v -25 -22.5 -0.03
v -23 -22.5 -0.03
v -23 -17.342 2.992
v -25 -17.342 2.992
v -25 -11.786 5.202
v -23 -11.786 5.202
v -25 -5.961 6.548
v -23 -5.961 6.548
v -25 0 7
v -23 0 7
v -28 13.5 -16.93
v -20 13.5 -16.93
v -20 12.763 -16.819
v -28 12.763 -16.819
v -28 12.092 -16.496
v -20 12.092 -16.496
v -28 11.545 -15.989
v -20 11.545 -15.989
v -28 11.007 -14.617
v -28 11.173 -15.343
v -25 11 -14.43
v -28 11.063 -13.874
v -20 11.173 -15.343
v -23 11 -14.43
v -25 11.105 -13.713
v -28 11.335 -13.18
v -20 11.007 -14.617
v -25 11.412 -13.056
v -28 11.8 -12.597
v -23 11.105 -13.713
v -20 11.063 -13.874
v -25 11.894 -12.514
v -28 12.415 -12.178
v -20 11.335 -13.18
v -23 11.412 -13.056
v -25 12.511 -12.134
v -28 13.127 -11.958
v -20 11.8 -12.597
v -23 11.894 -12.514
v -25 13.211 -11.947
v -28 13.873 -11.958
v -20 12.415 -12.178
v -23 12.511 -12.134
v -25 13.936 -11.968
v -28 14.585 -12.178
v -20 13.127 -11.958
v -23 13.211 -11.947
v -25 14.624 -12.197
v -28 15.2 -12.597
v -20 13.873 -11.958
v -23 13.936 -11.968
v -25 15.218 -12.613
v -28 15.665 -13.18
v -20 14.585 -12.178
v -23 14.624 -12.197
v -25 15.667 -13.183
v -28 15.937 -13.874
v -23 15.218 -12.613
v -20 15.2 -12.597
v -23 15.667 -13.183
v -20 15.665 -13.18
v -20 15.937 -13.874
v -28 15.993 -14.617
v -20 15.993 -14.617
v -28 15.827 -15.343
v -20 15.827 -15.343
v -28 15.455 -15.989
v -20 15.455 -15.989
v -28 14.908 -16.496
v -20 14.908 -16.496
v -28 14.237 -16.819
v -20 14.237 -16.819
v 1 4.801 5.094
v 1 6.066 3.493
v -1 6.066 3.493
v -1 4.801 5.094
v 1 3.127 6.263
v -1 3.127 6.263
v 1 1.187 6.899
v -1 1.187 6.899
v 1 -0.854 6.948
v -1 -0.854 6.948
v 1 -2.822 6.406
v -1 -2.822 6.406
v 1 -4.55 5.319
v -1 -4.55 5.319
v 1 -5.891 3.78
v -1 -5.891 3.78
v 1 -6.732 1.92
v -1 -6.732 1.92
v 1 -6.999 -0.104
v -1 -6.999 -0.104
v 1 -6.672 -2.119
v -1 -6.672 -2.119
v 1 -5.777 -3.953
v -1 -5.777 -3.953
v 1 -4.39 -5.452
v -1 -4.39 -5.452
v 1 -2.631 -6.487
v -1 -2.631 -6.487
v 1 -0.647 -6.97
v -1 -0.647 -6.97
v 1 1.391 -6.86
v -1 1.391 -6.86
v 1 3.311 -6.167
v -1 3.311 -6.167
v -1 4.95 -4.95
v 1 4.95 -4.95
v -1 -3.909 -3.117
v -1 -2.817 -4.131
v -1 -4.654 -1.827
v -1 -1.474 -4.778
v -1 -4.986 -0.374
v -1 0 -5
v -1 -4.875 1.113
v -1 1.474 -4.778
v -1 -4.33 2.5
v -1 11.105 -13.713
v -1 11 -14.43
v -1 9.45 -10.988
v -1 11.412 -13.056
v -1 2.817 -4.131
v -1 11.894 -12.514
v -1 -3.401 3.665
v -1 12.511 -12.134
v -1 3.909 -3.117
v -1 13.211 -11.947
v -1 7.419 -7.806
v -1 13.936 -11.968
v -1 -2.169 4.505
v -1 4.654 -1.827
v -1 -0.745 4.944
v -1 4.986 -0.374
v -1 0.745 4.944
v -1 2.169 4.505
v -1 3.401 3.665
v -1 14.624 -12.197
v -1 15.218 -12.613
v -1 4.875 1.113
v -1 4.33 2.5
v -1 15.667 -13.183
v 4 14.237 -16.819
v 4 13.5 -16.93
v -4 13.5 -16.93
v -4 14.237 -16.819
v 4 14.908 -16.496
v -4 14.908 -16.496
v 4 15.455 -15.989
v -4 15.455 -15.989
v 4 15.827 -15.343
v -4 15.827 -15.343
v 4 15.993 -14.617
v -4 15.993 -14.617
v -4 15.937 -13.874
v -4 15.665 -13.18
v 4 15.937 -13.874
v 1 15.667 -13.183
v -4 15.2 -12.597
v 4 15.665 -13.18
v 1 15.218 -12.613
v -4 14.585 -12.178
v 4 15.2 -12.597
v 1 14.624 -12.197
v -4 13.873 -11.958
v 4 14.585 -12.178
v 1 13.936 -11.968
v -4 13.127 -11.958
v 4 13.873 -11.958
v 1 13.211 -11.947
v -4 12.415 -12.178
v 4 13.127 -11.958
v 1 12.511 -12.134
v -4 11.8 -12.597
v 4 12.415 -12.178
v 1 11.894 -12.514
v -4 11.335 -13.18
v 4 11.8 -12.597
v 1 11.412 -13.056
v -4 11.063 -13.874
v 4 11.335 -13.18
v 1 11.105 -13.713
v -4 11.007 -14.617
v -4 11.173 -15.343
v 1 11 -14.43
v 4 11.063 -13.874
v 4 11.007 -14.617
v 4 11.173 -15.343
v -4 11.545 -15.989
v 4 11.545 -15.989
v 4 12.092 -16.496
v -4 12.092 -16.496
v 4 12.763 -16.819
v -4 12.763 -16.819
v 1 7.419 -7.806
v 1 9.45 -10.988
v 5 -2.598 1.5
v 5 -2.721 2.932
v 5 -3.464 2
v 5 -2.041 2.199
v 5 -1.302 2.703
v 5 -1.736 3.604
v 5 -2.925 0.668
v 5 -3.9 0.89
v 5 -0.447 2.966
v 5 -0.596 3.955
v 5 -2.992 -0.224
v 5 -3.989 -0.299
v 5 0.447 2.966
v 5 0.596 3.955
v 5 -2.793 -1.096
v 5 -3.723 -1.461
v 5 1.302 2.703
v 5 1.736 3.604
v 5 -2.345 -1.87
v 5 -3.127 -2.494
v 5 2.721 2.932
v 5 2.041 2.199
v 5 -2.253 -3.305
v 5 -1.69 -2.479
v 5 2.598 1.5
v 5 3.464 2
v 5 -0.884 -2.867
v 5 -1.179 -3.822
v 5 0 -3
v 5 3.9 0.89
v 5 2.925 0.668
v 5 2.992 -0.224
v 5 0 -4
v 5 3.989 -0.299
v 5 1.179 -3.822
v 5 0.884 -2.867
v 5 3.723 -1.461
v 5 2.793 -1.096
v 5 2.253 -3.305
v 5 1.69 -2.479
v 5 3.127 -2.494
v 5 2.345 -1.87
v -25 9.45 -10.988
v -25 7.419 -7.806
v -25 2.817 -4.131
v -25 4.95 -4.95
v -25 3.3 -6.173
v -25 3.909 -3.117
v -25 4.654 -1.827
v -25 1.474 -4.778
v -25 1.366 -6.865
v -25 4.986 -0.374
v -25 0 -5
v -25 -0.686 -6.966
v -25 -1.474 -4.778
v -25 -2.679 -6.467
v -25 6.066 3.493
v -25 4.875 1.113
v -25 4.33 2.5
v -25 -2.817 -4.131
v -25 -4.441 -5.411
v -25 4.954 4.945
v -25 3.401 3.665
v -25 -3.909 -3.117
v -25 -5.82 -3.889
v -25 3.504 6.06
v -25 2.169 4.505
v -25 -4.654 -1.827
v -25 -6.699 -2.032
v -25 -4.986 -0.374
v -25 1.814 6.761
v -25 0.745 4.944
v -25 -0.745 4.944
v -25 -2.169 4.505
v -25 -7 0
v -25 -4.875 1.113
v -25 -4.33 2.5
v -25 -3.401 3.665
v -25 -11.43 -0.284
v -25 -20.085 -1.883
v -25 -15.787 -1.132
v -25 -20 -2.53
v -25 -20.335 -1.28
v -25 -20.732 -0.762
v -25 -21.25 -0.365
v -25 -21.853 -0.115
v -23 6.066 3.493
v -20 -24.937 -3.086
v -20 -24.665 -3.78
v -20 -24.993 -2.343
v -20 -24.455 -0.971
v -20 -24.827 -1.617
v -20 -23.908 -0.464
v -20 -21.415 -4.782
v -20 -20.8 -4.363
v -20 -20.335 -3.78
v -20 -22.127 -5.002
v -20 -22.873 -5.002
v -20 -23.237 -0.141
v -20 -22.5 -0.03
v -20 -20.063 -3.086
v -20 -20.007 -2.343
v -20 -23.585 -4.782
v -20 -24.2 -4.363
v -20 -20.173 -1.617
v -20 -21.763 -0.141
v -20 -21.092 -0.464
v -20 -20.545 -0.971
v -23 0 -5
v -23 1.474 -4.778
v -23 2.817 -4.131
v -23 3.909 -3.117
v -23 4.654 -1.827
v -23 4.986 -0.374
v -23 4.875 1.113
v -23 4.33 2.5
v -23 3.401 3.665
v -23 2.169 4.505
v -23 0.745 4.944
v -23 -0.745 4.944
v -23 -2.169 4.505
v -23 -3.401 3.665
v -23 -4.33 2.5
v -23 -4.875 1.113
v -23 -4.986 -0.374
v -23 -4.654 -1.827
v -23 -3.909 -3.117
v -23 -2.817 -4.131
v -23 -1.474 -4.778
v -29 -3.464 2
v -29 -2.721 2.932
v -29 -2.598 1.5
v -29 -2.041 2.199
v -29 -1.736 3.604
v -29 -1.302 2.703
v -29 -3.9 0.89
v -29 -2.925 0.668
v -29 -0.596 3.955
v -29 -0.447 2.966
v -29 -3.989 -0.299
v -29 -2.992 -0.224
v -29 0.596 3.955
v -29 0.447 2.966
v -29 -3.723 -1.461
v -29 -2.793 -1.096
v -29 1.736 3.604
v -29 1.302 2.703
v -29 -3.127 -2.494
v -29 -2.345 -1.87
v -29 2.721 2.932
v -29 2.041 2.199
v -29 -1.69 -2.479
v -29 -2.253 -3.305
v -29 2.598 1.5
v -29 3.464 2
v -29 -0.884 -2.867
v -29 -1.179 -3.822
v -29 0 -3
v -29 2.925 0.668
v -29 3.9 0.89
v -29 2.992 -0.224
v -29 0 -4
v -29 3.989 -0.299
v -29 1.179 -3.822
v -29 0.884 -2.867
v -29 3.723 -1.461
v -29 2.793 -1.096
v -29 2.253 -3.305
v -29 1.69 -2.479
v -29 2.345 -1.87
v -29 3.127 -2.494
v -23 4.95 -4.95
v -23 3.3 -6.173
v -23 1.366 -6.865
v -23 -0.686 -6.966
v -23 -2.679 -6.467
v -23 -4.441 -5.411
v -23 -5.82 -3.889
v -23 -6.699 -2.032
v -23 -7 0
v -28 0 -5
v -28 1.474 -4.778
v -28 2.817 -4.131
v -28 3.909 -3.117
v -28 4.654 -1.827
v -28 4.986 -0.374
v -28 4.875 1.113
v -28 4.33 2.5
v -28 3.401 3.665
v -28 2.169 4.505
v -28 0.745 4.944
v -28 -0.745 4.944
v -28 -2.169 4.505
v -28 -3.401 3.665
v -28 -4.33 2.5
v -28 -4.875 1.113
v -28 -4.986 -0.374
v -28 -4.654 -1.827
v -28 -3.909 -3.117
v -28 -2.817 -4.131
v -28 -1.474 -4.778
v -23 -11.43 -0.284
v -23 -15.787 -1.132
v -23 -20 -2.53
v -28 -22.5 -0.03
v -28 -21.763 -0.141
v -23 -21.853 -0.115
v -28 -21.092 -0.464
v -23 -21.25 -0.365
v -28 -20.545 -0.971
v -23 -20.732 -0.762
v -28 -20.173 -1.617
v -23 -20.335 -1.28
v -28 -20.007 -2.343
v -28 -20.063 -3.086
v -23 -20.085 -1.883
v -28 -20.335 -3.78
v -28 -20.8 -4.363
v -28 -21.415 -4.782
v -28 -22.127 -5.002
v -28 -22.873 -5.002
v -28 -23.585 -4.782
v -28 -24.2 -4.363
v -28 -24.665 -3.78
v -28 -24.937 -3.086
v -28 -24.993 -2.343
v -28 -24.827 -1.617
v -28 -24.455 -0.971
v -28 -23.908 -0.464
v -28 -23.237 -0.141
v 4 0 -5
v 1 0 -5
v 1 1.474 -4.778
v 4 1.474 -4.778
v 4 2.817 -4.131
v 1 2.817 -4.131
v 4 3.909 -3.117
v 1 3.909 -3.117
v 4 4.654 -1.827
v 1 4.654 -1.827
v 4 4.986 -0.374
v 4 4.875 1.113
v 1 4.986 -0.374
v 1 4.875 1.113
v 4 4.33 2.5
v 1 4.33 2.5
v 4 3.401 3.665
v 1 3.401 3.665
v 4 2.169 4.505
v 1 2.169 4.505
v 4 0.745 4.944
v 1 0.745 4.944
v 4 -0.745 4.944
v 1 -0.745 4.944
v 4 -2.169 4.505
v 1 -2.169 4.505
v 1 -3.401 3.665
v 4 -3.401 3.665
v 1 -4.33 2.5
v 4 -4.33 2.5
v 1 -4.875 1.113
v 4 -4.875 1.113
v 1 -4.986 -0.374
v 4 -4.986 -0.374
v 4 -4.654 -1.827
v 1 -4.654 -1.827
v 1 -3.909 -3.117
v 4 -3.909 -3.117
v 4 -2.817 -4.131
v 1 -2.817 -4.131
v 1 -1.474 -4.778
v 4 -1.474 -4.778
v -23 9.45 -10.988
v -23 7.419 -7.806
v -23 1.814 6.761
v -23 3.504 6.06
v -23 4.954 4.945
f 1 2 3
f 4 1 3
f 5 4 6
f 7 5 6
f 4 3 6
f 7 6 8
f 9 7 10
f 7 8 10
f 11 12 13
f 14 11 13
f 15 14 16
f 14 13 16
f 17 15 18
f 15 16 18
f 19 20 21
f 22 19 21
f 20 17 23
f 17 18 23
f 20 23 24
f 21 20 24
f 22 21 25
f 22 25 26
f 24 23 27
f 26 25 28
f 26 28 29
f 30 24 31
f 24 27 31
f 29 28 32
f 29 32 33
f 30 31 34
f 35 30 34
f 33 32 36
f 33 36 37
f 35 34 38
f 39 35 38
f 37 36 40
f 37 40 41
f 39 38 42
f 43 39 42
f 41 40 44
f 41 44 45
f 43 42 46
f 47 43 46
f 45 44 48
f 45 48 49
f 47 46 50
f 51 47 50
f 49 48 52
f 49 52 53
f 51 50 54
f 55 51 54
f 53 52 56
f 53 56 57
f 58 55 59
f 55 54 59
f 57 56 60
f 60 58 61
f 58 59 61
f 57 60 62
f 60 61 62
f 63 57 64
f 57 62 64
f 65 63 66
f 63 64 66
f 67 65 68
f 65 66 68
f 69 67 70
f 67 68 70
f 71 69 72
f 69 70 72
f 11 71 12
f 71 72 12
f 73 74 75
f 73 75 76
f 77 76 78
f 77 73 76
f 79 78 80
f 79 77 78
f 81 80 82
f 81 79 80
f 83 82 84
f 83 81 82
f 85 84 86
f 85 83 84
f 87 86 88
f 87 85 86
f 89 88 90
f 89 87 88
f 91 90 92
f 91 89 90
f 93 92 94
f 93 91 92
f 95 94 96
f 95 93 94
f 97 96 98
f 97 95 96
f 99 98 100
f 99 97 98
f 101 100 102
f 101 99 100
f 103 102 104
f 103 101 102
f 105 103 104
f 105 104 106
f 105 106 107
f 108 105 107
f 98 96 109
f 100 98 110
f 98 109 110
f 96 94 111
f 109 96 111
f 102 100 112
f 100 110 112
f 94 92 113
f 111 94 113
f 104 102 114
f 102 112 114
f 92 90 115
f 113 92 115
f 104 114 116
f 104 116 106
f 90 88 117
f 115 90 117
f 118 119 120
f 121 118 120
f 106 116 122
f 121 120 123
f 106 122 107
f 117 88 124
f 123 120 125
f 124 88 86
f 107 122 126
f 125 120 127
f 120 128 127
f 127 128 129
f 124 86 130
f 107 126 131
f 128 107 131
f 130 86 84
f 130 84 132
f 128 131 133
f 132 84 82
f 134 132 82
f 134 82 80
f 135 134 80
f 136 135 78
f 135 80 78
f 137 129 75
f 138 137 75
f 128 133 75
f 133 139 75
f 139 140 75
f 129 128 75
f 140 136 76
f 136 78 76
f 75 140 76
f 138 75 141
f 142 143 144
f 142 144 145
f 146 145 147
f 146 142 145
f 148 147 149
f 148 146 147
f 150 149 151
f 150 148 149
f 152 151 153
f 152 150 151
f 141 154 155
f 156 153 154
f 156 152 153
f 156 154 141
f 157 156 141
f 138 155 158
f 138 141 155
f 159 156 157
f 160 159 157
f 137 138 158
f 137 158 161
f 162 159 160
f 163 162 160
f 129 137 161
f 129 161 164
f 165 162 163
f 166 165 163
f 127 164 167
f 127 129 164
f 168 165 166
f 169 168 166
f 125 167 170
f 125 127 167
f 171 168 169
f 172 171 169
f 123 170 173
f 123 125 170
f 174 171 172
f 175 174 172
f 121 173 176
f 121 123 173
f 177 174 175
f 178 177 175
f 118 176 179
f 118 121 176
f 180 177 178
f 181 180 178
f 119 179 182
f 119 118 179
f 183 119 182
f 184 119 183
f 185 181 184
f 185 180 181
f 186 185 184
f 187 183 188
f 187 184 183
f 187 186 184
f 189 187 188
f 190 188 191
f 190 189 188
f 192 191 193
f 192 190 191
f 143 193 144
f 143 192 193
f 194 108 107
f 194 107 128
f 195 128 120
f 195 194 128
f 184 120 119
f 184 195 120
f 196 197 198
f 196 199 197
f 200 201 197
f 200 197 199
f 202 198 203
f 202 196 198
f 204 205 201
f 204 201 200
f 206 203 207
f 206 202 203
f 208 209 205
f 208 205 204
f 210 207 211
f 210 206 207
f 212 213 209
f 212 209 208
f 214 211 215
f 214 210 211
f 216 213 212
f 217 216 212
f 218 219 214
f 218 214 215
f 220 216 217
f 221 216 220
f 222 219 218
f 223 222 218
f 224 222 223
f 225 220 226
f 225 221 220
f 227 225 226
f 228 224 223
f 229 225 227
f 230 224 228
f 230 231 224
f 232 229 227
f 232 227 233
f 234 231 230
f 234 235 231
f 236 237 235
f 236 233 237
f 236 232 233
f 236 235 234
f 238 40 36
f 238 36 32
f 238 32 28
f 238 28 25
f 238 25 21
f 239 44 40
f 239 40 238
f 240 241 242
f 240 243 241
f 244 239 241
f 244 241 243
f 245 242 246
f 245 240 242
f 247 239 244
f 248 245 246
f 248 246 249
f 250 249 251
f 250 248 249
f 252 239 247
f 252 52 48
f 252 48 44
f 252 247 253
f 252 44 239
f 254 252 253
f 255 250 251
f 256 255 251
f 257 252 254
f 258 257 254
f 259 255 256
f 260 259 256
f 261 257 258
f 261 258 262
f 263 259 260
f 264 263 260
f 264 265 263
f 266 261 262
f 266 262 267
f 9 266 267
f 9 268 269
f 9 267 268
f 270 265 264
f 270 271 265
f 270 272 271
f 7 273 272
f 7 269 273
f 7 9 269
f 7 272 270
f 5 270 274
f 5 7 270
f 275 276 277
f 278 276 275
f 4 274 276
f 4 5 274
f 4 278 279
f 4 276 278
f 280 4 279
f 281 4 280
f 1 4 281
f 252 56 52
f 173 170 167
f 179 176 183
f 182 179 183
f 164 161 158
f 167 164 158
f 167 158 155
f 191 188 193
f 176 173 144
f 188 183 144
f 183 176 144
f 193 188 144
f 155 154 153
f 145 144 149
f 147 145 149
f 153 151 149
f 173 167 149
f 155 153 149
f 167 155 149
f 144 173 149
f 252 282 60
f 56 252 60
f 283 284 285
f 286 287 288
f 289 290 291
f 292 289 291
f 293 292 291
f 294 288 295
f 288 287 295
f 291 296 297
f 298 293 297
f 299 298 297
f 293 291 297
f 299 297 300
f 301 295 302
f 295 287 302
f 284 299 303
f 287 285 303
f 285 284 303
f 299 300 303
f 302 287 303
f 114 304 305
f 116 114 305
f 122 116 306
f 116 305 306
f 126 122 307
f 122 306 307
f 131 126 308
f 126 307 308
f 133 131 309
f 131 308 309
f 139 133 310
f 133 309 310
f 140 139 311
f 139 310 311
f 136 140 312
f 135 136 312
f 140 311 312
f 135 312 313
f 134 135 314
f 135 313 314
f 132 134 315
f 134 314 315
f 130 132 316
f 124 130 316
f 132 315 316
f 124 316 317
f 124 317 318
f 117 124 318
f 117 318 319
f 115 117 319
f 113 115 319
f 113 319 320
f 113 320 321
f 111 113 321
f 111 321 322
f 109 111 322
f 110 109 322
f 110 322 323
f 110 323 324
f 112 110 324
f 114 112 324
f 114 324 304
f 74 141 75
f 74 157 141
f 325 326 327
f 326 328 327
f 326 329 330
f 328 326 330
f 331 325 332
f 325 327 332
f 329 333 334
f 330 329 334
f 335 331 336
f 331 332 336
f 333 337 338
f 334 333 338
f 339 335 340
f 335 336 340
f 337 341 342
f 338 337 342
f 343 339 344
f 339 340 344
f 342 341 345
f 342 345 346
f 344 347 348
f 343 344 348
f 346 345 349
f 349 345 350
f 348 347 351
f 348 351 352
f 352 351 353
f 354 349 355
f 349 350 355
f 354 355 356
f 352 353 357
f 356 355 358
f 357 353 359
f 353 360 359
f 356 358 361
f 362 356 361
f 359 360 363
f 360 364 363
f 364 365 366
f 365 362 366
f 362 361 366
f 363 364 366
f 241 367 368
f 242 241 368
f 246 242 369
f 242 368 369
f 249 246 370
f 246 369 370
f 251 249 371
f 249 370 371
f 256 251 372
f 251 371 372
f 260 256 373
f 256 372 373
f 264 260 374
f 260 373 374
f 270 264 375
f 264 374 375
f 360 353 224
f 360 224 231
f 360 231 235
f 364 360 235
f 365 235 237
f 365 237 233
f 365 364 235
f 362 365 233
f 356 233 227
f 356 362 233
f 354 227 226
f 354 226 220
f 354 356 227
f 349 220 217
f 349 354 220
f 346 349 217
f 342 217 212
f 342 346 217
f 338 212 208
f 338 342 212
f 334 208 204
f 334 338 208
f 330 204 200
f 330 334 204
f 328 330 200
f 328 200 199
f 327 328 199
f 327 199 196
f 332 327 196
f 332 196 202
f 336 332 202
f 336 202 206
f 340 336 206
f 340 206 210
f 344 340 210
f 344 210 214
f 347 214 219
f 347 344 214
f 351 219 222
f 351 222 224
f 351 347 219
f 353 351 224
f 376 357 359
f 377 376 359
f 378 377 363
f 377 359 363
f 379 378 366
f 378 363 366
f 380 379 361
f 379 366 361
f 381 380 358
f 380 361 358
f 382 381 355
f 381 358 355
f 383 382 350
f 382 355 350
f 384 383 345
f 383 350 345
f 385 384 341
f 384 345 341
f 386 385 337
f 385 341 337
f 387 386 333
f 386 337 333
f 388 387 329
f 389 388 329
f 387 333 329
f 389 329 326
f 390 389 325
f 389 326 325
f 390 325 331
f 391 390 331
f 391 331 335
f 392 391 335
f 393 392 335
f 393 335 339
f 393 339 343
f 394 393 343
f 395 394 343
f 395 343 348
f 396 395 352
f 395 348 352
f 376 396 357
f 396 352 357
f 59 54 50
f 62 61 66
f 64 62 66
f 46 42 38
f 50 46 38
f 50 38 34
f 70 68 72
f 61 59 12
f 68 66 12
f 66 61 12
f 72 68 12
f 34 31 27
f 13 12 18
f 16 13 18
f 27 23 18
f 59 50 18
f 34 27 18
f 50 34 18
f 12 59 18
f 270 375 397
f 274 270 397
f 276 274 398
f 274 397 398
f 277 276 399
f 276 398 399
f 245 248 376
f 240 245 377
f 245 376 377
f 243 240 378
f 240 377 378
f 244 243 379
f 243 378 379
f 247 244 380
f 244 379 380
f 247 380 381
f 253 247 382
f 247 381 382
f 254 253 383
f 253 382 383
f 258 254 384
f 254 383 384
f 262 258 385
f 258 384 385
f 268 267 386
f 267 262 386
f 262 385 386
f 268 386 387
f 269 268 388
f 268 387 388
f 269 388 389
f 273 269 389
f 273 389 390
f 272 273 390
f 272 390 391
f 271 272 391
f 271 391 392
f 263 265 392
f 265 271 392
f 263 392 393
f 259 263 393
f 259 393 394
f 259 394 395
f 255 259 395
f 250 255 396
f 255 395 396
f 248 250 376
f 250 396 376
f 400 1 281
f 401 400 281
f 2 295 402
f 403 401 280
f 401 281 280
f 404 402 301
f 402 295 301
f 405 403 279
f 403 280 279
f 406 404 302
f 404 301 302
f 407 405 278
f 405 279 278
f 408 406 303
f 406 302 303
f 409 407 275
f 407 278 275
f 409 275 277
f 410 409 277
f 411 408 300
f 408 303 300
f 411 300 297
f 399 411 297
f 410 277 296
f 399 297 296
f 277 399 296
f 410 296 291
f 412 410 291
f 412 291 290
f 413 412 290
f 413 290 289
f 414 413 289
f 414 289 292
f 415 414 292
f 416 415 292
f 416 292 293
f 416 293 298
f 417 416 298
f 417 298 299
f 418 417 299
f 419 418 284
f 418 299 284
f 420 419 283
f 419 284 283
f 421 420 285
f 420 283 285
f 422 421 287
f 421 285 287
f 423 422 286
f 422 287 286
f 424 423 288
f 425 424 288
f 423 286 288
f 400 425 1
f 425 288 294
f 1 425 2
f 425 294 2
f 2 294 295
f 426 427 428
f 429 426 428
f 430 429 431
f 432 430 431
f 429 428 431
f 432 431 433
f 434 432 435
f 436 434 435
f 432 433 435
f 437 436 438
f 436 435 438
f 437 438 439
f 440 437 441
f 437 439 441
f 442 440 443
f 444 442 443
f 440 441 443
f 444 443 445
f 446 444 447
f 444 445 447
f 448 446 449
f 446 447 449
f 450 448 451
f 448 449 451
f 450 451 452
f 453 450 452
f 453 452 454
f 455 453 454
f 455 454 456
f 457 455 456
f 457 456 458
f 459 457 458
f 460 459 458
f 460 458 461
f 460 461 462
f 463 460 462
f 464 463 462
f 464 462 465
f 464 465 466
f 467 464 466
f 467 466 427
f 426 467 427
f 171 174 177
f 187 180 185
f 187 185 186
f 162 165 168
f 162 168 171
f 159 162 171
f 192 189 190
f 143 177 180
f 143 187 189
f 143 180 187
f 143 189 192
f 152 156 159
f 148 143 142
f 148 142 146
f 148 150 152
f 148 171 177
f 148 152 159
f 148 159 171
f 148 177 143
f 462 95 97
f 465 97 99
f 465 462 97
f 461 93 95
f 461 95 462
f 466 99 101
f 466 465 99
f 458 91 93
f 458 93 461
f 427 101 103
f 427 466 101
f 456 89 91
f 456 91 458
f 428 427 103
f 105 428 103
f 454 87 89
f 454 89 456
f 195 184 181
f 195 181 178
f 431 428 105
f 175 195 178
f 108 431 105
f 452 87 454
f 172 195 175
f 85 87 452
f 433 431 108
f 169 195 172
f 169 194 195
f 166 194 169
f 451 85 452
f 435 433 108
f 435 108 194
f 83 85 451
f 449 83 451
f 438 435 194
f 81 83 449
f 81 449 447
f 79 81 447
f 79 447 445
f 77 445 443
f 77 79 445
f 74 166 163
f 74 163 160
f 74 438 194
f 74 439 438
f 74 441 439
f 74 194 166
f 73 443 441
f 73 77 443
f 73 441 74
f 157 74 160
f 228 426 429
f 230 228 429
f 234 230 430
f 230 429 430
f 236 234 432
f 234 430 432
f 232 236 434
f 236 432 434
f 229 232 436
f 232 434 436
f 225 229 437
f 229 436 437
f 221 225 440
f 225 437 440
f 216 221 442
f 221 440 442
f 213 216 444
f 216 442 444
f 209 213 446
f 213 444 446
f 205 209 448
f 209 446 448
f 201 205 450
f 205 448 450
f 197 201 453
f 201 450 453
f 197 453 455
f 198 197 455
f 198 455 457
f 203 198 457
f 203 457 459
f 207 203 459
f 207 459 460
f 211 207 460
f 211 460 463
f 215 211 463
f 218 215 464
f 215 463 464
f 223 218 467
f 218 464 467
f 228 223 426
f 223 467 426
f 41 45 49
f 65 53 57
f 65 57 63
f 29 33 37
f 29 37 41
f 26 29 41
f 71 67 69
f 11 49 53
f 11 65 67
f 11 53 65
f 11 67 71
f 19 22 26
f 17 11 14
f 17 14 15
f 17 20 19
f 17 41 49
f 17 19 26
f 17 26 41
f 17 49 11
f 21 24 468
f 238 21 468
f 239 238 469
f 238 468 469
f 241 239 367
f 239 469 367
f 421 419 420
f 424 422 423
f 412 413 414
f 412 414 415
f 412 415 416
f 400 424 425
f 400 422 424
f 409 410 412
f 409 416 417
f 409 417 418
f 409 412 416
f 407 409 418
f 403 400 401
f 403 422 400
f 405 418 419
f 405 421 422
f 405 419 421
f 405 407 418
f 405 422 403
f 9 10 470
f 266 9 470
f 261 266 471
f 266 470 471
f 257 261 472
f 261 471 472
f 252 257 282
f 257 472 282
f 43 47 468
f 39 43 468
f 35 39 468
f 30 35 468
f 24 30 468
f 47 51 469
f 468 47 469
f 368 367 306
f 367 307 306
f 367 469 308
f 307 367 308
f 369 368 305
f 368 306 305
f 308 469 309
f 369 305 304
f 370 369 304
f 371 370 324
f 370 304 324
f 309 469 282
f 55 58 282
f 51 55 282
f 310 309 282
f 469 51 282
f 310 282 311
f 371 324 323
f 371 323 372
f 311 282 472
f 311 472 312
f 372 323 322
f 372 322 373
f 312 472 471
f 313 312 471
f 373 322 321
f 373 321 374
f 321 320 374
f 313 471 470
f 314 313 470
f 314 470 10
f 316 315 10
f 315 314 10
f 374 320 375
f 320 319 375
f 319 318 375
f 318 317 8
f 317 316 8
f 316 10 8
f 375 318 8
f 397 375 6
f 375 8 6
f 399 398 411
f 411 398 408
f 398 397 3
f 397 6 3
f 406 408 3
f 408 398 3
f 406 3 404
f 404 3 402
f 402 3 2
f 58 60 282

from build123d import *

# Parameters (mm, degrees)
SKETCH1_R                = 2.5
BOSS_EXTRUDE1_DEPTH      = 4
SKETCH1_3_R              = 5
BOSS_EXTRUDE2_DEPTH      = 1
BOSS_EXTRUDE3_DEPTH      = 6
BOSS_EXTRUDE3_DEPTH_BACK = 28
BOSS_EXTRUDE3_START      = -1
SKETCH1_4_R              = 5
SKETCH1_4_R_2            = 3
SKETCH2_R                = 5
BOSS_EXTRUDE6_DEPTH      = 2
BOSS_EXTRUDE7_DEPTH      = 5
BOSS_EXTRUDE7_DEPTH_BACK = 3
SKETCH2_5_R              = 2.5
CHAMFER1_SIZE            = 1


with BuildPart() as part:
    # Sketch1 → Boss-Extrude1 (new, symmetric)
    with BuildSketch(Plane.YZ):
        with Locations(Location((13.5, -14.43, 0), (0, 0, 270))):
            Circle(SKETCH1_R)
    extrude(amount=BOSS_EXTRUDE1_DEPTH, both=True)

    # Sketch1<3> → Boss-Extrude2 (add, symmetric)
    with BuildSketch(Plane.YZ):
        with BuildLine():
            Line((15.666598525, -13.182662503), (6.06647587, 3.492544992))
            ThreePointArc((6.06647587, 3.492544992), (-6.939551113, 0.917948988), (4.949747468, -4.949747468))
            ThreePointArc((4.949747468, -4.949747468), (8.491768153, -9.35999415), (11, -14.43))
            ThreePointArc((11, -14.43), (12.854436801, -12.014788176), (15.666598525, -13.182662503))
        make_face()
        with Locations(Location((0, 0, 0), (0, 0, 270))):
            Circle(SKETCH1_3_R, mode=Mode.SUBTRACT)
    extrude(amount=BOSS_EXTRUDE2_DEPTH, both=True)

    # Sketch1<4> → Boss-Extrude3 (add, two sides: drawn at the far end of the back side and taken through both)
    with BuildSketch(Plane.YZ.offset(BOSS_EXTRUDE3_START - BOSS_EXTRUDE3_DEPTH_BACK)):
        with Locations(Location((0, 0, 0), (0, 0, 270))):
            Circle(SKETCH1_4_R)
        with Locations(Location((0, 0, 0), (0, 0, 270))):
            Circle(SKETCH1_4_R_2, mode=Mode.SUBTRACT)
    extrude(amount=BOSS_EXTRUDE3_DEPTH + BOSS_EXTRUDE3_DEPTH_BACK)

    # Sketch2 → Boss-Extrude6 (add)
    # profile 1 of 2: a face of its own
    with BuildSketch(Plane(origin=(-23, 0, 0), x_dir=(0, -1, 0), z_dir=(-1, 0, 0))):
        with BuildLine():
            ThreePointArc((-9.4233e-05, 6.999999999), (-3.50376631, 6.060001786), (-6.06647587, 3.492544992))
            Line((-6.06647587, 3.492544992), (-15.666598525, -13.182662503))
            ThreePointArc((-15.666598525, -13.182662503), (-12.854436801, -12.014788176), (-11, -14.43))
            ThreePointArc((-11, -14.43), (-8.491768153, -9.35999415), (-4.949747468, -4.949747468))
            ThreePointArc((-4.949747468, -4.949747468), (2.678784027, -6.467156728), (7, 0))
            ThreePointArc((7, 0), (4.949714152, 4.949780784), (-9.4233e-05, 6.999999999))
        make_face()
        with Locations(Location((0, 0, 0), (0, 0, 270))):
            Circle(SKETCH2_R, mode=Mode.SUBTRACT)
    # profile 2 of 2: a face of its own
    with BuildSketch(Plane(origin=(-23, 0, 0), x_dir=(0, -1, 0), z_dir=(-1, 0, 0))):
        with BuildLine():
            ThreePointArc((22.5, -0.03), (11.786311318, 5.201659363), (-9.4233e-05, 6.999999999))
            ThreePointArc((-9.4233e-05, 6.999999999), (4.949714152, 4.949780784), (7, 0))
            ThreePointArc((7, 0), (13.62196533, -0.638300674), (20, -2.53))
            ThreePointArc((20, -2.53), (20.732233047, -0.762233047), (22.5, -0.03))
        make_face()
    extrude(amount=BOSS_EXTRUDE6_DEPTH)

    # Sketch2<5> → Boss-Extrude7 (add, two sides: drawn at the far end of the back side and taken through both)
    with BuildSketch(Plane(origin=(-23, 0, 0), x_dir=(0, -1, 0), z_dir=(-1, 0, 0)).offset(-BOSS_EXTRUDE7_DEPTH_BACK)):
        with Locations(Location((22.5, -2.53, 0), (0, 0, 90))):
            Circle(SKETCH2_5_R)
        with Locations(Location((-13.5, -14.43, 0), (0, 0, 270))):
            Circle(SKETCH2_5_R)
    extrude(amount=BOSS_EXTRUDE7_DEPTH + BOSS_EXTRUDE7_DEPTH_BACK)

    # Chamfer1
    chamfer1_edges = [part.edges().sort_by_distance(p)[0] for p in [
        (-29, 0, 5),
        (5, 0, 5),
    ]]
    chamfer(chamfer1_edges, length=CHAMFER1_SIZE)


solid = part.part
